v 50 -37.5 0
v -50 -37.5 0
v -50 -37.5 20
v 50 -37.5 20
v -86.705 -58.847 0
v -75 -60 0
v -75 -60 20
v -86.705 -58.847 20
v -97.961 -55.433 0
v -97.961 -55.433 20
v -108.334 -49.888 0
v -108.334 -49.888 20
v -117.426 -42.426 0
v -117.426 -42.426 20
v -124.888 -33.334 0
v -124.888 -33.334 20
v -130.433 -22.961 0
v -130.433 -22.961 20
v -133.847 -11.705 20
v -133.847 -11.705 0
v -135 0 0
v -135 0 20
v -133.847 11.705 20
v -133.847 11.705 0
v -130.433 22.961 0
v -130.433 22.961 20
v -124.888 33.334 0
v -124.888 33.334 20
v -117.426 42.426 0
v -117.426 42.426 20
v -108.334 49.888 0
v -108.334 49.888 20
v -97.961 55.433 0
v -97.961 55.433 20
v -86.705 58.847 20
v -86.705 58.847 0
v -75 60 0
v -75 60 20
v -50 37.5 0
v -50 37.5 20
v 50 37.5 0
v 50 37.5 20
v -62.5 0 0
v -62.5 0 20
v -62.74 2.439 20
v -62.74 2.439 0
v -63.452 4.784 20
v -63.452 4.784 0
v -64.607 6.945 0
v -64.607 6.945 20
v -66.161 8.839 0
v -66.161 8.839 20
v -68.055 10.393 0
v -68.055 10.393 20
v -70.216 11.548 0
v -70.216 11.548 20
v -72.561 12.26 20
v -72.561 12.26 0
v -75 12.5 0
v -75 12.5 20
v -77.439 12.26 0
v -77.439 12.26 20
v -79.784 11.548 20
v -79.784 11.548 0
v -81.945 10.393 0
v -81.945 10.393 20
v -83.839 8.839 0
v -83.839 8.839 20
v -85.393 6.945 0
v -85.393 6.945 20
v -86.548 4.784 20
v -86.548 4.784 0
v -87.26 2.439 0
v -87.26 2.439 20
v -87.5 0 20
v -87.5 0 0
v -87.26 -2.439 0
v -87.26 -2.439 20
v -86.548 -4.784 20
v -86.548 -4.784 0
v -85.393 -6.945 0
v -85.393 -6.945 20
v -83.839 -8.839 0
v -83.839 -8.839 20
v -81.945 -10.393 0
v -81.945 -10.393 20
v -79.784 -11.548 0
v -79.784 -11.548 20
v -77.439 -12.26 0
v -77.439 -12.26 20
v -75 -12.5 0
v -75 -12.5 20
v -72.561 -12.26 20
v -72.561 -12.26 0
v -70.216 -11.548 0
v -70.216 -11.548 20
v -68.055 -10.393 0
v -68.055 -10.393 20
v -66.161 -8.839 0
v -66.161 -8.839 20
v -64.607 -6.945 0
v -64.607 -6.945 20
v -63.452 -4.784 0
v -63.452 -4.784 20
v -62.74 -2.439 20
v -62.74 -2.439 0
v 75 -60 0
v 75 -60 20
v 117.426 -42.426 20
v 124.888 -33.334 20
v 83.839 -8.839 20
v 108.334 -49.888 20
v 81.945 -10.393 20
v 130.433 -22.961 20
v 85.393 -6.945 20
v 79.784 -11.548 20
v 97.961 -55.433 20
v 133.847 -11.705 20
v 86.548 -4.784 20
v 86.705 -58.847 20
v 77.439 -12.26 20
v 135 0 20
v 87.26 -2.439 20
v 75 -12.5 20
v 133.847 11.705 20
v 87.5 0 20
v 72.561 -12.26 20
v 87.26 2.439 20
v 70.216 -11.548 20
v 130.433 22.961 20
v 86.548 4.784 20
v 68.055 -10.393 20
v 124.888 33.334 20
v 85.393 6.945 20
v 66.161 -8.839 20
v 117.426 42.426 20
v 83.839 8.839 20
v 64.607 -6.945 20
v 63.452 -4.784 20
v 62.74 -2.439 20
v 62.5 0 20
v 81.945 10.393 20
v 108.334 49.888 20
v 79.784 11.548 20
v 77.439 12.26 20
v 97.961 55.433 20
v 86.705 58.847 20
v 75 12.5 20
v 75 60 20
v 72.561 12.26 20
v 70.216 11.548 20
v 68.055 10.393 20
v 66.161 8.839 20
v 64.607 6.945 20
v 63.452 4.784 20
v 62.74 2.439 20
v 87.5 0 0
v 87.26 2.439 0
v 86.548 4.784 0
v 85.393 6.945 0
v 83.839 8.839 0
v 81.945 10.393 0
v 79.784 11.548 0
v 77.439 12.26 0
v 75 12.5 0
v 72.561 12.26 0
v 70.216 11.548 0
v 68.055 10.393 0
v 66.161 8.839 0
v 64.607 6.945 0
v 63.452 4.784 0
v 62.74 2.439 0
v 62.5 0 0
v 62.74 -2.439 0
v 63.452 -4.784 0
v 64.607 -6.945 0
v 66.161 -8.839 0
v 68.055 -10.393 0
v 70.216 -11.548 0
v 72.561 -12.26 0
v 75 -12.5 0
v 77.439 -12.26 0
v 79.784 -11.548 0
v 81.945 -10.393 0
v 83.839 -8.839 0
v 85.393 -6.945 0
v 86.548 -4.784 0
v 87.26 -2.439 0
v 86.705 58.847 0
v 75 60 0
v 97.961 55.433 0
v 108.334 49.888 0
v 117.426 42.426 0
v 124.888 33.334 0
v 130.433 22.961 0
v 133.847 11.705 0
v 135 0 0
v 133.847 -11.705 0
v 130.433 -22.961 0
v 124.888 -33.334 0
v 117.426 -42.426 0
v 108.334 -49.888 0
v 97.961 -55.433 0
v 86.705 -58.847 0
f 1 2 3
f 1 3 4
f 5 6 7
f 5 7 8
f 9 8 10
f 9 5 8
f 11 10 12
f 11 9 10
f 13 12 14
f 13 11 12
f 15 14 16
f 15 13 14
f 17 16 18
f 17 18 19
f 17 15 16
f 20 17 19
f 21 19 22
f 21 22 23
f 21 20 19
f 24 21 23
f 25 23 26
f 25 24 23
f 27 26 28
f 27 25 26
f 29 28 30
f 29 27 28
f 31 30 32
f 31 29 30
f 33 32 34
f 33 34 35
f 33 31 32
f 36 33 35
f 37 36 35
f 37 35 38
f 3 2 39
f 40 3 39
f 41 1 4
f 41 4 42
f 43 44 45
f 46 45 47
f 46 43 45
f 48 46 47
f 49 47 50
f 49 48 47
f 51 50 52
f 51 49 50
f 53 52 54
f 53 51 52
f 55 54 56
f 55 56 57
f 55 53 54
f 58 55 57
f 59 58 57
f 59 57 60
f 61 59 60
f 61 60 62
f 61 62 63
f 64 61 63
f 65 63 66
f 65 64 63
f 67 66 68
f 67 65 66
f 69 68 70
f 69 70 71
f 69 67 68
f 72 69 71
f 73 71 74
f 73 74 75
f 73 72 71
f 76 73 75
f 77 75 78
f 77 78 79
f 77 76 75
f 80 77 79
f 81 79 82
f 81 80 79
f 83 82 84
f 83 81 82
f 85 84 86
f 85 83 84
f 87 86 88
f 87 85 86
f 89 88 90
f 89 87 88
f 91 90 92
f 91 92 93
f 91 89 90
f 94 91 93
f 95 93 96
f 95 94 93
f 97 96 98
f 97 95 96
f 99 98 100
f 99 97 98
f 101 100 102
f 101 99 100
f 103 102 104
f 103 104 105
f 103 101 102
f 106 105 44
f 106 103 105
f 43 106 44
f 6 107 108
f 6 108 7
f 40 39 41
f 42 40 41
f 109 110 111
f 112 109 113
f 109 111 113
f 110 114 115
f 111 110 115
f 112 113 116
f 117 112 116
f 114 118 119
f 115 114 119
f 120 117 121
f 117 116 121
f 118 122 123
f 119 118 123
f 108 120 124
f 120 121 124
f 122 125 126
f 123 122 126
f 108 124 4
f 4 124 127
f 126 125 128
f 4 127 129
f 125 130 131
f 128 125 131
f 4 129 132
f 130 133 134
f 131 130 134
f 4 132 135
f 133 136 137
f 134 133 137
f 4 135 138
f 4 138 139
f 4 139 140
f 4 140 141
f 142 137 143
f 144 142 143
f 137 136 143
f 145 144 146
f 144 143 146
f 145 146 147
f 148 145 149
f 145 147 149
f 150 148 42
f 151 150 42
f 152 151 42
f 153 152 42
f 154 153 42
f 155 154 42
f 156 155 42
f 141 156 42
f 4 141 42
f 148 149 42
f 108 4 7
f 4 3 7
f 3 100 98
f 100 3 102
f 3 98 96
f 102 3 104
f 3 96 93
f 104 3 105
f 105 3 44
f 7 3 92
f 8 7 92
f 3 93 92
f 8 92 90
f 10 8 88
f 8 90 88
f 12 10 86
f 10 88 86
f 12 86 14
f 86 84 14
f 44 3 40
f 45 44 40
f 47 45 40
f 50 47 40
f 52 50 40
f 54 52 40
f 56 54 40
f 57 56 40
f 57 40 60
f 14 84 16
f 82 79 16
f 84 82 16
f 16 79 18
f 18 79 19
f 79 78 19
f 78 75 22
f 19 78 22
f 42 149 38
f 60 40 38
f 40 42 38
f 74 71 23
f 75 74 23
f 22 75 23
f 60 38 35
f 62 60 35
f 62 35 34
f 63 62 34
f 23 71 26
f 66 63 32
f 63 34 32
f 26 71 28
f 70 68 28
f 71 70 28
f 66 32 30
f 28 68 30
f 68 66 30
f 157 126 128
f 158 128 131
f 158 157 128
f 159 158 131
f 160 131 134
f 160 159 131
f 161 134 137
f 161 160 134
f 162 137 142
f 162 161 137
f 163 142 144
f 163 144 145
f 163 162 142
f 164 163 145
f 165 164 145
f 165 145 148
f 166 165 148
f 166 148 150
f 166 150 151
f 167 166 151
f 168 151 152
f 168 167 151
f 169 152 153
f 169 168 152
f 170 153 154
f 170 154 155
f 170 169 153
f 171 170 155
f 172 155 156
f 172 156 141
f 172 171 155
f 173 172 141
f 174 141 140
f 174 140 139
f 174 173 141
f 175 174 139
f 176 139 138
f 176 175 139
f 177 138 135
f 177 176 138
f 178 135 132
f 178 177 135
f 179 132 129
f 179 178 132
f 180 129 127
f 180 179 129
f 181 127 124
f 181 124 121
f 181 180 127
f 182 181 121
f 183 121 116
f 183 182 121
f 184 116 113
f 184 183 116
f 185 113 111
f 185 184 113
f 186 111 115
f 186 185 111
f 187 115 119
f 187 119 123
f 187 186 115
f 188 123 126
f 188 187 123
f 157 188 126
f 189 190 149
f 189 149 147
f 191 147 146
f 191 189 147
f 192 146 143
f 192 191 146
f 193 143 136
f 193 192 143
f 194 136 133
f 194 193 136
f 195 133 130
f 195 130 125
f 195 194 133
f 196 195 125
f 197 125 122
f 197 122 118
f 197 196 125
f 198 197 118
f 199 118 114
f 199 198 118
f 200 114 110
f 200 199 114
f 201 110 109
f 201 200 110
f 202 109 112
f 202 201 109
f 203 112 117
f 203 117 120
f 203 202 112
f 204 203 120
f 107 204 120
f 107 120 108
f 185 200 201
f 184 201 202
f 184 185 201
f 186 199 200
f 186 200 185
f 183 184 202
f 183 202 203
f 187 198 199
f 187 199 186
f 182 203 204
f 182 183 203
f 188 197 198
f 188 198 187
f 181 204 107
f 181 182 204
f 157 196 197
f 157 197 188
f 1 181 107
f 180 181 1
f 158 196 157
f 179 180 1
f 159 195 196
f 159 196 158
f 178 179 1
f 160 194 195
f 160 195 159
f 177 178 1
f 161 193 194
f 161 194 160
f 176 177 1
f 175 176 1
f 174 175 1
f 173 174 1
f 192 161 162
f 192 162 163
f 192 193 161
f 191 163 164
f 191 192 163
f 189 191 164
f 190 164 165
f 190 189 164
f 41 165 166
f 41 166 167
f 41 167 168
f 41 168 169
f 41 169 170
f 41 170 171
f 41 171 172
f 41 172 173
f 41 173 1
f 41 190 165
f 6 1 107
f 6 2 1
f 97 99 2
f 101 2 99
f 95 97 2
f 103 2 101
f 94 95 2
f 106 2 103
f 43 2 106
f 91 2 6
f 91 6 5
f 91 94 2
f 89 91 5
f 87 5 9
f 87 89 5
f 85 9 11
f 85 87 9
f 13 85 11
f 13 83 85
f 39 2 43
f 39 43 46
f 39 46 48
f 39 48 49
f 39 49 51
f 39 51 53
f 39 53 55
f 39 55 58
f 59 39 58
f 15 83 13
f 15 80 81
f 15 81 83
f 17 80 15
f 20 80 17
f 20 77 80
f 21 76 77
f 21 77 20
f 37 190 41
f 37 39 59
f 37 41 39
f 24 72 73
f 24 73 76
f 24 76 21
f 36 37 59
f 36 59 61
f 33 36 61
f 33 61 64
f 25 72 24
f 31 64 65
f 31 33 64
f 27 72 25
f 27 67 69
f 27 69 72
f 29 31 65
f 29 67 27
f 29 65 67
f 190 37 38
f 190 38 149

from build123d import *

# Parameters (mm, degrees)
SKETCH1_R           = 12.5
SKETCH1_W           = 100
SKETCH1_H           = 75
BOSS_EXTRUDE1_DEPTH = 20


with BuildPart() as part:
    # Sketch1 → Boss-Extrude1 (new body)
    with BuildSketch(Plane.XY):
        with BuildLine():
            Line((-75, 60), (75, 60))
            ThreePointArc((75, 60), (135, 0), (75, -60))
            Line((75, -60), (-75, -60))
            ThreePointArc((-75, -60), (-135, 0), (-75, 60))
        make_face()
        with Locations((75, 0)):
            Circle(SKETCH1_R, mode=Mode.SUBTRACT)
        with Locations((-75, 0)):
            Circle(SKETCH1_R, mode=Mode.SUBTRACT)
        Rectangle(SKETCH1_W, SKETCH1_H, mode=Mode.SUBTRACT)
    extrude(amount=BOSS_EXTRUDE1_DEPTH)


solid = part.part
